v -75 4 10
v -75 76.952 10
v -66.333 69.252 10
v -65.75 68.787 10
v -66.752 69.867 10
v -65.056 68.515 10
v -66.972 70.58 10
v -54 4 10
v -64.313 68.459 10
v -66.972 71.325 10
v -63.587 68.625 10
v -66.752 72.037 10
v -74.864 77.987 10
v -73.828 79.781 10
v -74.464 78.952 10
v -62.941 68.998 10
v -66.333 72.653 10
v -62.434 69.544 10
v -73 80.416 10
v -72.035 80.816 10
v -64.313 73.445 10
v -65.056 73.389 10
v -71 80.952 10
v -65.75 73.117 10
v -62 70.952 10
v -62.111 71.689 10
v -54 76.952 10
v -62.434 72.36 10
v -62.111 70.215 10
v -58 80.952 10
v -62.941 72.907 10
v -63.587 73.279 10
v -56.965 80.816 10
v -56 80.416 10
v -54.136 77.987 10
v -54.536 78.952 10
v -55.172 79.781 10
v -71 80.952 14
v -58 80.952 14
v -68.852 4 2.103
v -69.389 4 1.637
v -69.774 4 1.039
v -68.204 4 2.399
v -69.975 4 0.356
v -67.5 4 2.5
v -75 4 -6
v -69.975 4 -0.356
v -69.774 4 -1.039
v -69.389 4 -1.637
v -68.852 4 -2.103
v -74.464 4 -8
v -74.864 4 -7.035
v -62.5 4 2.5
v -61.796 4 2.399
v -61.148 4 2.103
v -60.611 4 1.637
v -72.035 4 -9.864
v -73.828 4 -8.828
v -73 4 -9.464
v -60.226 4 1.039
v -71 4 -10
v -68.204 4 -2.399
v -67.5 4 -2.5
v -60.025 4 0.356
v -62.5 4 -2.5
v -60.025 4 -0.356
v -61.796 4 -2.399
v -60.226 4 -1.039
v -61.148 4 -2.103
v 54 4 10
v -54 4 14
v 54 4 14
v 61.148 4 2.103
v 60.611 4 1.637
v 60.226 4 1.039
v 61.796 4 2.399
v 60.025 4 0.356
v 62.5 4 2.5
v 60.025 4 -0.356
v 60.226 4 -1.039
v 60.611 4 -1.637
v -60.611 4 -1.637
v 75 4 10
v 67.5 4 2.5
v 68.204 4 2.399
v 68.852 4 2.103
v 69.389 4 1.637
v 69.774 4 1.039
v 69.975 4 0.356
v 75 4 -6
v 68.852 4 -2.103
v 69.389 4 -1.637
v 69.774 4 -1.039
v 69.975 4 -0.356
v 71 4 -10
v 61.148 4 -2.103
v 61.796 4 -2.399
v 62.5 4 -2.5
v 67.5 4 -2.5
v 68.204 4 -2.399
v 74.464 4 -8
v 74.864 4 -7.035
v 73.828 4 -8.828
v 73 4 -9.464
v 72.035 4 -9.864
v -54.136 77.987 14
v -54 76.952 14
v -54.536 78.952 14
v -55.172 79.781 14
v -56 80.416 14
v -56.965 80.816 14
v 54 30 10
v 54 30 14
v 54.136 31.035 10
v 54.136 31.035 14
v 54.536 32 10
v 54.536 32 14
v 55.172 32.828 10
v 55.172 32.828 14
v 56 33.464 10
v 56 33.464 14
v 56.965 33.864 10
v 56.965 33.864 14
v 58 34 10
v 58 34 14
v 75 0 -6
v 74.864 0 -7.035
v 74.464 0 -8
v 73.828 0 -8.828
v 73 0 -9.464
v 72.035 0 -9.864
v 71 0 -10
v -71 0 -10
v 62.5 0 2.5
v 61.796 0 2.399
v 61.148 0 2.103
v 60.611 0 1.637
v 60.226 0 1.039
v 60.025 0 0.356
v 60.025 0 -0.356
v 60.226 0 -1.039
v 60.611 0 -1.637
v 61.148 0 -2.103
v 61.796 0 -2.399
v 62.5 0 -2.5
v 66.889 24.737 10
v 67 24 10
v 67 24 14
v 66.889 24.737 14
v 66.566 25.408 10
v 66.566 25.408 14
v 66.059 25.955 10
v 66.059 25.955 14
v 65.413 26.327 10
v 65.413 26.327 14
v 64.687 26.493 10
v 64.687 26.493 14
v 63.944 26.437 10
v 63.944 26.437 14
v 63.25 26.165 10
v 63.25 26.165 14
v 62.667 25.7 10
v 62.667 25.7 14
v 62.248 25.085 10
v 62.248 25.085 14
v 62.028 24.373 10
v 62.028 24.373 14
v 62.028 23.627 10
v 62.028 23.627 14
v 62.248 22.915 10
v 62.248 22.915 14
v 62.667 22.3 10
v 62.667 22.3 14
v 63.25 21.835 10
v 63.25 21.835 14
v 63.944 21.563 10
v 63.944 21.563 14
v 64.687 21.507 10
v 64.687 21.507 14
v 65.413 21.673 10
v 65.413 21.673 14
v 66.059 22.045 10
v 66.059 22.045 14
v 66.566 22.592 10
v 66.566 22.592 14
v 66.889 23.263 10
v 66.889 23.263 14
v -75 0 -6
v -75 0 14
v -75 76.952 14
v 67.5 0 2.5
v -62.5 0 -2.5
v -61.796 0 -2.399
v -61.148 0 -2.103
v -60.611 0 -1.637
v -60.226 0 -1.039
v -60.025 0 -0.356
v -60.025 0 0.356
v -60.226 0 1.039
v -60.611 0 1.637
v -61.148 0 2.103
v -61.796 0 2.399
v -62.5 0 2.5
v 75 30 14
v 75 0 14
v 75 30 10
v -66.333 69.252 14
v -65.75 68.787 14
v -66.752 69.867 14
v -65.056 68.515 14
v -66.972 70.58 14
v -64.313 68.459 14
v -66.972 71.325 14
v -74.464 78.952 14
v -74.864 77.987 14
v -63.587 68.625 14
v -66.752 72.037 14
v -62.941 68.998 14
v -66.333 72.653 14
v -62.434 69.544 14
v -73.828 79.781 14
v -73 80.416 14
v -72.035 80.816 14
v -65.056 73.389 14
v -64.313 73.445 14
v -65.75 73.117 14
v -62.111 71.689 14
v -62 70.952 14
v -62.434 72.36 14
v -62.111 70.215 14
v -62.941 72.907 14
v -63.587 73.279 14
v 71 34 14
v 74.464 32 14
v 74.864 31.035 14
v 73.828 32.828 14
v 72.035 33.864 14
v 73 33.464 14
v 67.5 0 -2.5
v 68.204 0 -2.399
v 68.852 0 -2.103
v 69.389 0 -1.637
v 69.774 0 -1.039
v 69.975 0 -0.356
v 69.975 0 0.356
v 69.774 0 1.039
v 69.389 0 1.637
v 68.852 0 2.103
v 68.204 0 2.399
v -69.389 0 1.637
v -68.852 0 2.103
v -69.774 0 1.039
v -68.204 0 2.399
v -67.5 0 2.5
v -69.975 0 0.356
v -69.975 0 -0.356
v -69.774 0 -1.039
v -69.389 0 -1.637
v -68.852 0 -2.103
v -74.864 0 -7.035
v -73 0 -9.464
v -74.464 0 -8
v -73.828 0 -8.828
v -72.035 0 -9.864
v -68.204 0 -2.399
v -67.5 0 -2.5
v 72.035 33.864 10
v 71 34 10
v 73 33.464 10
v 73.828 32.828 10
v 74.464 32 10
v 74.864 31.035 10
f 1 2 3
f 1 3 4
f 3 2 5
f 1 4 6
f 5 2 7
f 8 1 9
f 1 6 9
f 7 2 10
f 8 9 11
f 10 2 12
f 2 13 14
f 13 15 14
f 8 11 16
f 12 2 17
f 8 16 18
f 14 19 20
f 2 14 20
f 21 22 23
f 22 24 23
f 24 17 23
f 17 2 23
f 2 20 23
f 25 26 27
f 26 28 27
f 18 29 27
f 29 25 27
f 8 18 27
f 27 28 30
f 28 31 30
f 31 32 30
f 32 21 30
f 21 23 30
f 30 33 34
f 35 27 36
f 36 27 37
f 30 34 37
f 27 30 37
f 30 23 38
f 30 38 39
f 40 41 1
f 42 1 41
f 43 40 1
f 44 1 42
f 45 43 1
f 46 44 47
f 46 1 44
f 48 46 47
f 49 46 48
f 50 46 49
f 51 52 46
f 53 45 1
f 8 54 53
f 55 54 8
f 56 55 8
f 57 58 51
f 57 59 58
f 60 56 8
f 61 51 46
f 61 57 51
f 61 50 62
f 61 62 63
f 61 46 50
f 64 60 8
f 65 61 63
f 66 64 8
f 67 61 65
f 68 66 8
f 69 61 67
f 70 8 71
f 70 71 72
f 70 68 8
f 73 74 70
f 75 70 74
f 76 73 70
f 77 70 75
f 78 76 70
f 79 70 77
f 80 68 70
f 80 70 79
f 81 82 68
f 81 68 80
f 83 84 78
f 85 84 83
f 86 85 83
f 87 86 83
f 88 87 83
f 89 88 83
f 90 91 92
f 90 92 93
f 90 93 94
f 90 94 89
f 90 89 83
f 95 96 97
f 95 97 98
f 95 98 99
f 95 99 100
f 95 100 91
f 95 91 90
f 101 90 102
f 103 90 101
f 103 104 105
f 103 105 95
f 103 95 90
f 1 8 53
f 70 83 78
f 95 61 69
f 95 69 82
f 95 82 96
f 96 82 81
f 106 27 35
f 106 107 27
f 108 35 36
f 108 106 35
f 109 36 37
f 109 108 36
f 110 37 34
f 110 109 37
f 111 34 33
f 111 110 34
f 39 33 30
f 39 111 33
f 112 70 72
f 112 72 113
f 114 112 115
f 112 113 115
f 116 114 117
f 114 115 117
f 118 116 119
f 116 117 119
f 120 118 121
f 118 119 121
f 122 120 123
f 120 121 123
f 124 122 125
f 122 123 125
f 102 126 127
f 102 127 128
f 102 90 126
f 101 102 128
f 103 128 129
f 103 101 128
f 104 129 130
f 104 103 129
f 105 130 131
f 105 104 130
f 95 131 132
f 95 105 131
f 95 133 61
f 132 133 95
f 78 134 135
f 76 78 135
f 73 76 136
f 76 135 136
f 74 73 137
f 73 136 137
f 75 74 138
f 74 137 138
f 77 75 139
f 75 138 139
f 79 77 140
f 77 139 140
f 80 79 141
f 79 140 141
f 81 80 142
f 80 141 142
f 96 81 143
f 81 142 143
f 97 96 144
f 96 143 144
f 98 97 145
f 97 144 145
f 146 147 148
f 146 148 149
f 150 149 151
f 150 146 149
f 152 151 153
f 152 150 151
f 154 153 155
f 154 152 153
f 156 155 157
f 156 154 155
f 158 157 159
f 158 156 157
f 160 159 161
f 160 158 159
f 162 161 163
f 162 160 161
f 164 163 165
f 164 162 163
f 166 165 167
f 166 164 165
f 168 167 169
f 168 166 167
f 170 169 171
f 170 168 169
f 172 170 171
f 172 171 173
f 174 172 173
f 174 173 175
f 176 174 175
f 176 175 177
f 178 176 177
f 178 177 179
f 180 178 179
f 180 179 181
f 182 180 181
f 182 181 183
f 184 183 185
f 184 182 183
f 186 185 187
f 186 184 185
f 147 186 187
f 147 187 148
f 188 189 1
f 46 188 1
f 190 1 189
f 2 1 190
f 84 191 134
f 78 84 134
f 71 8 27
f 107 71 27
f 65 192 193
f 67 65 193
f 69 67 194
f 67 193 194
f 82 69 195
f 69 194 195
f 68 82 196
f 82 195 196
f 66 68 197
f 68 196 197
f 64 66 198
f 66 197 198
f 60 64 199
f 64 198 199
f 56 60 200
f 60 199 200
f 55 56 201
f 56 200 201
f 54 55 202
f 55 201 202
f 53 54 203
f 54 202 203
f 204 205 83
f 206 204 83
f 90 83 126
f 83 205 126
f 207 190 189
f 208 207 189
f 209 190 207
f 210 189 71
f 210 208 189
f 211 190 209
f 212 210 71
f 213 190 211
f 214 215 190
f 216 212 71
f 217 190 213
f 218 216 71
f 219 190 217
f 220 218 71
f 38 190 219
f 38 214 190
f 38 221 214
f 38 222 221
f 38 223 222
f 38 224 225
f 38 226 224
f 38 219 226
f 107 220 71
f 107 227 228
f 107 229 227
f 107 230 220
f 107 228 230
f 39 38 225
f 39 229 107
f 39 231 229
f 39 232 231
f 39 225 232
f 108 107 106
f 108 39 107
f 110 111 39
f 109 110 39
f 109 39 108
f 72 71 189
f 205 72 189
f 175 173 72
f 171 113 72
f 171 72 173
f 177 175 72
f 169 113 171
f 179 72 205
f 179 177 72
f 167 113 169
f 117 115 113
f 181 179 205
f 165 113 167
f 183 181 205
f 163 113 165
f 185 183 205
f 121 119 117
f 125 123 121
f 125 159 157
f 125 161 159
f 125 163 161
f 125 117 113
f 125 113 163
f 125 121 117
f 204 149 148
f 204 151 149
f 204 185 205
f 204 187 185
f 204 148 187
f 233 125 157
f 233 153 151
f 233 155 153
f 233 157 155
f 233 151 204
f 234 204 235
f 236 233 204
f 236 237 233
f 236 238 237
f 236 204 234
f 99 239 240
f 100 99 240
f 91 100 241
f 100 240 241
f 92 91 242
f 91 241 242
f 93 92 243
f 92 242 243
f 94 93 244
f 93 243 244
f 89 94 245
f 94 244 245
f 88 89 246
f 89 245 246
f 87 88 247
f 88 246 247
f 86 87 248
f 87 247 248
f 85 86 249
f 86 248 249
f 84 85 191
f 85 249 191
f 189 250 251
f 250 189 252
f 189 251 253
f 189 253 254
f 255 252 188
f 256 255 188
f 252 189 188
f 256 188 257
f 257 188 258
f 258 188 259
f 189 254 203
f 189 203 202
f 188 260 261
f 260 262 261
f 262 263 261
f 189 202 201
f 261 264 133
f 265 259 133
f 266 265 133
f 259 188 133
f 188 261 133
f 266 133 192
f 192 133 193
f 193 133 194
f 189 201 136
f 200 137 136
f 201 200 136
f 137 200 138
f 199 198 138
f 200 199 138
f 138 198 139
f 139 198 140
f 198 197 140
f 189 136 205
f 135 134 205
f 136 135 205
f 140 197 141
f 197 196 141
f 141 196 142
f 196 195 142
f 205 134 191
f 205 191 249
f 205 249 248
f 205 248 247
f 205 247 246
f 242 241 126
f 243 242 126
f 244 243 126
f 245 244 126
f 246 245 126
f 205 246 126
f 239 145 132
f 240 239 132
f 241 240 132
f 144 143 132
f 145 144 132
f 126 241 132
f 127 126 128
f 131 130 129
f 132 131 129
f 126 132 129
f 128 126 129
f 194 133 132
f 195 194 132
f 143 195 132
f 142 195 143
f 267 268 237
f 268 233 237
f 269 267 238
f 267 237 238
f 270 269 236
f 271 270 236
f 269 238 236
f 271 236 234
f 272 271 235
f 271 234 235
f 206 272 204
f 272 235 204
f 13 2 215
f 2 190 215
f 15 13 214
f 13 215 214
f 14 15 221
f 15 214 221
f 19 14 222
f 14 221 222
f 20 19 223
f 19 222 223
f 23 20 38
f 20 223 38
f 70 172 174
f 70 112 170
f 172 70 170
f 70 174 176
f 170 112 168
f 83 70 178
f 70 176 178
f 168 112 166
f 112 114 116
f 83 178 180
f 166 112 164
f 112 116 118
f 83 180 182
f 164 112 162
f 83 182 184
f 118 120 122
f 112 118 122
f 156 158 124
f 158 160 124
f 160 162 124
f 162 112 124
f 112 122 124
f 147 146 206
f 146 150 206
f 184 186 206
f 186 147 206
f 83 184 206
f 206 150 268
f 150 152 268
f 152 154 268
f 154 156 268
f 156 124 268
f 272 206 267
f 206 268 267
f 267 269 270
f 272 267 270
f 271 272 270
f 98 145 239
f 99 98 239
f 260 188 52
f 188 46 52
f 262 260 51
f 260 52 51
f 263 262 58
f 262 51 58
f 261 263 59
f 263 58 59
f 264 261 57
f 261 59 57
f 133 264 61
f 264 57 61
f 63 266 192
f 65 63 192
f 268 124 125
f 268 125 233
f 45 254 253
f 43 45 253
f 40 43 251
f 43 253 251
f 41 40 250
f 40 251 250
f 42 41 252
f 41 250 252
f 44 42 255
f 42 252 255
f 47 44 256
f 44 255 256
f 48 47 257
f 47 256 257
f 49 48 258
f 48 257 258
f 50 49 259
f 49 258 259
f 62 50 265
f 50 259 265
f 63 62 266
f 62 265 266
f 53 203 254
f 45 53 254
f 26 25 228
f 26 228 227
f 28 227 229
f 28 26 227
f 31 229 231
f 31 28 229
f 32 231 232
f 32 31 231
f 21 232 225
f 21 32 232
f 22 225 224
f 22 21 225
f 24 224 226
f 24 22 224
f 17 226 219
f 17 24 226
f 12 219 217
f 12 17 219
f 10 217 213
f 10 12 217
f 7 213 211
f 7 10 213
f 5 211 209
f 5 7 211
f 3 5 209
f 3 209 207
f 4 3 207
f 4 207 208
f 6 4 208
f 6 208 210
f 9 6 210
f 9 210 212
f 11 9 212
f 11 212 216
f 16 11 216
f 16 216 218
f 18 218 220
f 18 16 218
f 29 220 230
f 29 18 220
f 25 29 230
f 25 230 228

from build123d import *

# Parameters (mm, degrees)
SKETCH1_W           = 150
SKETCH1_H           = 20
BOSS_EXTRUDE1_DEPTH = 4
SKETCH2_W           = 21
SKETCH2_H           = 76.95216022
SKETCH2_R           = 2.5
SKETCH2_H_2         = 4
SKETCH2_W_2         = 108
SKETCH2_H_3         = 30
BOSS_EXTRUDE2_DEPTH = 4
FILLET1_R           = 4


with BuildPart() as part:
    # Sketch1 → Boss-Extrude1 (new body)
    with BuildSketch(Plane(origin=(0, 0, 0), x_dir=(1, 0, 0), z_dir=(0, 1, 0))):
        Rectangle(SKETCH1_W, SKETCH1_H)
        with BuildLine():
            Line((-67.5, 2.5), (-62.5, 2.5))
            ThreePointArc((-62.5, 2.5), (-60, 0), (-62.5, -2.5))
            Line((-62.5, -2.5), (-67.5, -2.5))
            ThreePointArc((-67.5, -2.5), (-70, 0), (-67.5, 2.5))
        make_face(mode=Mode.SUBTRACT)
        with BuildLine():
            Line((62.5, 2.5), (67.5, 2.5))
            ThreePointArc((67.5, 2.5), (70, 0), (67.5, -2.5))
            Line((67.5, -2.5), (62.5, -2.5))
            ThreePointArc((62.5, -2.5), (60, 0), (62.5, 2.5))
        make_face(mode=Mode.SUBTRACT)
    extrude(amount=BOSS_EXTRUDE1_DEPTH)

    # Sketch2 → Boss-Extrude2 (add)
    # profile 1 of 5: a face of its own
    with BuildSketch(Plane.XY.offset(10)):
        with Locations((-64.5, 42.47608011)):
            Rectangle(SKETCH2_W, SKETCH2_H)
        with Locations((-64.5, 70.95216022)):
            Circle(SKETCH2_R, mode=Mode.SUBTRACT)
    # profile 2 of 5: a face of its own
    with BuildSketch(Plane.XY.offset(10)):
        with Locations((-64.5, 2)):
            Rectangle(SKETCH2_W, SKETCH2_H_2)
    # profile 3 of 5: a face of its own
    with BuildSketch(Plane.XY.offset(10)):
        with Locations((0, 2)):
            Rectangle(SKETCH2_W_2, SKETCH2_H_2)
    # profile 4 of 5: a face of its own
    with BuildSketch(Plane.XY.offset(10)):
        with Locations((64.5, 2)):
            Rectangle(SKETCH2_W, SKETCH2_H_2)
    # profile 5 of 5: a face of its own
    with BuildSketch(Plane.XY.offset(10)):
        with Locations((64.5, 19)):
            Rectangle(SKETCH2_W, SKETCH2_H_3)
        with Locations((64.5, 24)):
            Circle(SKETCH2_R, mode=Mode.SUBTRACT)
    extrude(amount=BOSS_EXTRUDE2_DEPTH)

    # Fillet1
    fillet1_edges = [part.edges().sort_by_distance(p)[0] for p in [
        (-75, 80.95216022, 12),
        (75, 34, 12),
        (54, 34, 12),
        (-54, 80.95216022, 12),
        (-75, 2, -10),
        (75, 2, -10),
    ]]
    fillet(fillet1_edges, radius=FILLET1_R)


solid = part.part
